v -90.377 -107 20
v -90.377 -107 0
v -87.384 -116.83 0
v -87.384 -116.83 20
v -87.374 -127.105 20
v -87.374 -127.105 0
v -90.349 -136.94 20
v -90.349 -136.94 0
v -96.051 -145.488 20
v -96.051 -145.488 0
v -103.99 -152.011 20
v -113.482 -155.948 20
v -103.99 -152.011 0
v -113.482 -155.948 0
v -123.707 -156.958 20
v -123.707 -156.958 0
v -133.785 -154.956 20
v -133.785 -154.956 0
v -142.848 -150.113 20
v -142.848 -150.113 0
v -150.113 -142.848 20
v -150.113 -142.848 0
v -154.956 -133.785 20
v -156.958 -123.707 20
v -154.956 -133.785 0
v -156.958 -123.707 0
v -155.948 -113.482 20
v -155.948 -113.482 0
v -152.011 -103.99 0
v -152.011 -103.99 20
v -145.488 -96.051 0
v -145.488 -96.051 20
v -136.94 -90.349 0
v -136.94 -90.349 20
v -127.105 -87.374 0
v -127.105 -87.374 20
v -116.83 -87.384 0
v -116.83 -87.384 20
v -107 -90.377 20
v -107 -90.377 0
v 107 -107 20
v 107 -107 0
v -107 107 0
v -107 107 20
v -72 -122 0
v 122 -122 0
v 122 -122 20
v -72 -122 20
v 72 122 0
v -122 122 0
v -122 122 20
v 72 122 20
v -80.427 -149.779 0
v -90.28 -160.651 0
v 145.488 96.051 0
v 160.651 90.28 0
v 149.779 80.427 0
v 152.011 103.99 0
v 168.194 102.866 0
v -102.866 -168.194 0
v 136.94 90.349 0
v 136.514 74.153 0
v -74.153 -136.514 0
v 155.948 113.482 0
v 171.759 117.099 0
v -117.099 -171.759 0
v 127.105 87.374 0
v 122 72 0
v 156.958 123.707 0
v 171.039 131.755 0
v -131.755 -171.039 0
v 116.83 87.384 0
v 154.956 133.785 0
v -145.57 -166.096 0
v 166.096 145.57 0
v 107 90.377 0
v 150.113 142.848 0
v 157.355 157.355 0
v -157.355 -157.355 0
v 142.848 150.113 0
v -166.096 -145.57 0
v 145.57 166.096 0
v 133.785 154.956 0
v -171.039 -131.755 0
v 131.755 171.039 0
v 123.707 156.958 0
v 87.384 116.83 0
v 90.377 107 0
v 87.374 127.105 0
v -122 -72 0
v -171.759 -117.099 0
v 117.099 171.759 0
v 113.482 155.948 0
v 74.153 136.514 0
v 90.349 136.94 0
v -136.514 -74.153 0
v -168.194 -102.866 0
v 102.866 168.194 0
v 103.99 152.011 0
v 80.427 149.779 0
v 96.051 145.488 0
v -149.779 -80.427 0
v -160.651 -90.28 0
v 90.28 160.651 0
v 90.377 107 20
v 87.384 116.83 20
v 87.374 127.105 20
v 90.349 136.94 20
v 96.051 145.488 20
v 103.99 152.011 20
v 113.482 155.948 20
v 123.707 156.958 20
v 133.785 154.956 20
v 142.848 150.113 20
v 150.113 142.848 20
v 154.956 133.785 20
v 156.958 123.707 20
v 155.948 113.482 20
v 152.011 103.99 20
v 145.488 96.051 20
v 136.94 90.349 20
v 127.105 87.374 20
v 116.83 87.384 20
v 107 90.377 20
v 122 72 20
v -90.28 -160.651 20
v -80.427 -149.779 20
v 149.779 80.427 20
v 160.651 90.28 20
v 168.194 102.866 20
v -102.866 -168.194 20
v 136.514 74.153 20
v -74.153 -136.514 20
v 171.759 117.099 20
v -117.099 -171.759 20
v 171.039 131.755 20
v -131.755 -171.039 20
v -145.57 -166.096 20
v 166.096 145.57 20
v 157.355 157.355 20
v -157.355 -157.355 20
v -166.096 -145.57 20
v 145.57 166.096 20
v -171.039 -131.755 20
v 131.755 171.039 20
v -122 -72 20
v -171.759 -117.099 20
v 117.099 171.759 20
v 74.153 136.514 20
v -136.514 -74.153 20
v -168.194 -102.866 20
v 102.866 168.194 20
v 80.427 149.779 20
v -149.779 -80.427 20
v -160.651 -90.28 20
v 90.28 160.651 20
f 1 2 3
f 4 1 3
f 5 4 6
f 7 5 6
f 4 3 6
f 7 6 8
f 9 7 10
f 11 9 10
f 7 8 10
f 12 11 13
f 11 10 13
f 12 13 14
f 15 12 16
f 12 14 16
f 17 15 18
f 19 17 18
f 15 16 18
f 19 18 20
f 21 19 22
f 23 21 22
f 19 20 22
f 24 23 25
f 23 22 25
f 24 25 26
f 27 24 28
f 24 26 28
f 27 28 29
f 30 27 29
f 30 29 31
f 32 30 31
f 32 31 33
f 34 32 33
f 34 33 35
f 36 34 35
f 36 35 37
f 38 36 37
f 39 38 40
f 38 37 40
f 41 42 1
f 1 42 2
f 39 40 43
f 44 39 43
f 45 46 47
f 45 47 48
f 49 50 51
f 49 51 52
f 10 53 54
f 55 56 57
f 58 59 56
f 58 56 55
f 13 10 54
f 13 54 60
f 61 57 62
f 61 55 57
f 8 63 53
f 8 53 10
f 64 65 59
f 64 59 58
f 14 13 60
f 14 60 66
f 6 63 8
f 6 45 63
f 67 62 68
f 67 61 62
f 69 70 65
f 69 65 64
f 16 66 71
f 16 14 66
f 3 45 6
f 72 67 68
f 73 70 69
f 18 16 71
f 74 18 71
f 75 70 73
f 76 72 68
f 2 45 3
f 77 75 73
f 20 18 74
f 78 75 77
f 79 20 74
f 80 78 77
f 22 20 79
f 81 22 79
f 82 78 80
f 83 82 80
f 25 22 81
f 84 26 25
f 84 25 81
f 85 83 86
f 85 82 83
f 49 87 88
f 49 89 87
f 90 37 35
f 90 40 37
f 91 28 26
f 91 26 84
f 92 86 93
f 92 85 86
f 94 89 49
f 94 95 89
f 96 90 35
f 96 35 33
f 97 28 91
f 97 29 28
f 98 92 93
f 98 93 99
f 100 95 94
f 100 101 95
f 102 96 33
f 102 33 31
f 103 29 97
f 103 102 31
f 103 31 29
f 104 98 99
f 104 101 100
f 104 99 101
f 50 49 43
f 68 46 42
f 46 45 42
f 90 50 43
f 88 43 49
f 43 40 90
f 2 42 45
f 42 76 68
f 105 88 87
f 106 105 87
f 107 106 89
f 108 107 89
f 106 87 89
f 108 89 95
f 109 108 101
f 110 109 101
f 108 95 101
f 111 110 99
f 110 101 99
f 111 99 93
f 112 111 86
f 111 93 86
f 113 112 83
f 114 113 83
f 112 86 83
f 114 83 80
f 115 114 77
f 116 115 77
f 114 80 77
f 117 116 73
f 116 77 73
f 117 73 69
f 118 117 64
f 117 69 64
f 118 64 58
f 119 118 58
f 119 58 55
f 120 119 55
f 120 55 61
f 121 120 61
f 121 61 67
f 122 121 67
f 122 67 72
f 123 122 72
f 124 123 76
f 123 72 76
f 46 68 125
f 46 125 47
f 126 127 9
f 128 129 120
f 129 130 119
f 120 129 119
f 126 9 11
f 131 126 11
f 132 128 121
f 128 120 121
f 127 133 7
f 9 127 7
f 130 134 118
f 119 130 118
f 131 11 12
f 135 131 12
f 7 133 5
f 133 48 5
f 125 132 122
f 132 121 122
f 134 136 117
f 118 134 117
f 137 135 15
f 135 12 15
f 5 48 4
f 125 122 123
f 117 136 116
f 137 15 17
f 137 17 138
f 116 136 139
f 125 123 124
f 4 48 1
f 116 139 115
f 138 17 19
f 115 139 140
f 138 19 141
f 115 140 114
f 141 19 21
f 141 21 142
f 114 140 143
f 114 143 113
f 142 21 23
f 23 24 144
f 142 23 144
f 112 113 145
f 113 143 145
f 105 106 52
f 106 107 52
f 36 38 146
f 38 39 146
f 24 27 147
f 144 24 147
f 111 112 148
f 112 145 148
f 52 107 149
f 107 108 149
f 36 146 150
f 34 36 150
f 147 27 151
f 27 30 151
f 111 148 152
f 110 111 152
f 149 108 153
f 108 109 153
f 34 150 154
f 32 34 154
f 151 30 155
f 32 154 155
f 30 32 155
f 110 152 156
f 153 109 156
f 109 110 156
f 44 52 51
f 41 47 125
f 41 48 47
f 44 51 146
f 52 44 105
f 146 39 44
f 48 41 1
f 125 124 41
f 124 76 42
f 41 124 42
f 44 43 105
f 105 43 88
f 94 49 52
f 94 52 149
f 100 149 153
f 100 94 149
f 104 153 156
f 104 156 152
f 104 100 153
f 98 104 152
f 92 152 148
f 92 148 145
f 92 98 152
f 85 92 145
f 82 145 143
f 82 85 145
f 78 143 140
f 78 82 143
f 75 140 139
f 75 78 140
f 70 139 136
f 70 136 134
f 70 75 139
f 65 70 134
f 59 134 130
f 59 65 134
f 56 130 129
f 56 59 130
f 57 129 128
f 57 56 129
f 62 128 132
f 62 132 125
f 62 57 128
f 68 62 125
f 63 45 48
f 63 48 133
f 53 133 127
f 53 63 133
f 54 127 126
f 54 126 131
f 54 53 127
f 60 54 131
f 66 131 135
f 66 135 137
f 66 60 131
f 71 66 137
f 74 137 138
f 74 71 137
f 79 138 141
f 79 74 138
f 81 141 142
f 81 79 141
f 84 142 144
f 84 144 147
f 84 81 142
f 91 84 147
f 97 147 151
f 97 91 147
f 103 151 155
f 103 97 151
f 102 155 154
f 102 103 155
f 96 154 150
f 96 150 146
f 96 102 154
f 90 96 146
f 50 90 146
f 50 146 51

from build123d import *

# Parameters (mm, degrees)
BOSS_EXTRUDE1_DEPTH = 20


with BuildPart() as part:
    # Sketch1 → Boss-Extrude1 (new body)
    with BuildSketch(Plane.XY):
        with BuildLine():
            Line((-122, 122), (72, 122))
            ThreePointArc((72, 122), (157.355339059, 157.355339059), (122, 72))
            Line((122, 72), (122, -122))
            Line((122, -122), (-72, -122))
            ThreePointArc((-72, -122), (-157.355339059, -157.355339059), (-122, -72))
            Line((-122, -72), (-122, 122))
        make_face()
        with BuildLine():
            Line((-107, 107), (90.377223398, 107))
            ThreePointArc((90.377223398, 107), (146.748737342, 146.748737342), (107, 90.377223398))
            Line((107, 90.377223398), (107, -107))
            Line((107, -107), (-90.377223398, -107))
            ThreePointArc((-90.377223398, -107), (-146.748737342, -146.748737342), (-107, -90.377223398))
            Line((-107, -90.377223398), (-107, 107))
        make_face(mode=Mode.SUBTRACT)
    extrude(amount=BOSS_EXTRUDE1_DEPTH)


solid = part.part
